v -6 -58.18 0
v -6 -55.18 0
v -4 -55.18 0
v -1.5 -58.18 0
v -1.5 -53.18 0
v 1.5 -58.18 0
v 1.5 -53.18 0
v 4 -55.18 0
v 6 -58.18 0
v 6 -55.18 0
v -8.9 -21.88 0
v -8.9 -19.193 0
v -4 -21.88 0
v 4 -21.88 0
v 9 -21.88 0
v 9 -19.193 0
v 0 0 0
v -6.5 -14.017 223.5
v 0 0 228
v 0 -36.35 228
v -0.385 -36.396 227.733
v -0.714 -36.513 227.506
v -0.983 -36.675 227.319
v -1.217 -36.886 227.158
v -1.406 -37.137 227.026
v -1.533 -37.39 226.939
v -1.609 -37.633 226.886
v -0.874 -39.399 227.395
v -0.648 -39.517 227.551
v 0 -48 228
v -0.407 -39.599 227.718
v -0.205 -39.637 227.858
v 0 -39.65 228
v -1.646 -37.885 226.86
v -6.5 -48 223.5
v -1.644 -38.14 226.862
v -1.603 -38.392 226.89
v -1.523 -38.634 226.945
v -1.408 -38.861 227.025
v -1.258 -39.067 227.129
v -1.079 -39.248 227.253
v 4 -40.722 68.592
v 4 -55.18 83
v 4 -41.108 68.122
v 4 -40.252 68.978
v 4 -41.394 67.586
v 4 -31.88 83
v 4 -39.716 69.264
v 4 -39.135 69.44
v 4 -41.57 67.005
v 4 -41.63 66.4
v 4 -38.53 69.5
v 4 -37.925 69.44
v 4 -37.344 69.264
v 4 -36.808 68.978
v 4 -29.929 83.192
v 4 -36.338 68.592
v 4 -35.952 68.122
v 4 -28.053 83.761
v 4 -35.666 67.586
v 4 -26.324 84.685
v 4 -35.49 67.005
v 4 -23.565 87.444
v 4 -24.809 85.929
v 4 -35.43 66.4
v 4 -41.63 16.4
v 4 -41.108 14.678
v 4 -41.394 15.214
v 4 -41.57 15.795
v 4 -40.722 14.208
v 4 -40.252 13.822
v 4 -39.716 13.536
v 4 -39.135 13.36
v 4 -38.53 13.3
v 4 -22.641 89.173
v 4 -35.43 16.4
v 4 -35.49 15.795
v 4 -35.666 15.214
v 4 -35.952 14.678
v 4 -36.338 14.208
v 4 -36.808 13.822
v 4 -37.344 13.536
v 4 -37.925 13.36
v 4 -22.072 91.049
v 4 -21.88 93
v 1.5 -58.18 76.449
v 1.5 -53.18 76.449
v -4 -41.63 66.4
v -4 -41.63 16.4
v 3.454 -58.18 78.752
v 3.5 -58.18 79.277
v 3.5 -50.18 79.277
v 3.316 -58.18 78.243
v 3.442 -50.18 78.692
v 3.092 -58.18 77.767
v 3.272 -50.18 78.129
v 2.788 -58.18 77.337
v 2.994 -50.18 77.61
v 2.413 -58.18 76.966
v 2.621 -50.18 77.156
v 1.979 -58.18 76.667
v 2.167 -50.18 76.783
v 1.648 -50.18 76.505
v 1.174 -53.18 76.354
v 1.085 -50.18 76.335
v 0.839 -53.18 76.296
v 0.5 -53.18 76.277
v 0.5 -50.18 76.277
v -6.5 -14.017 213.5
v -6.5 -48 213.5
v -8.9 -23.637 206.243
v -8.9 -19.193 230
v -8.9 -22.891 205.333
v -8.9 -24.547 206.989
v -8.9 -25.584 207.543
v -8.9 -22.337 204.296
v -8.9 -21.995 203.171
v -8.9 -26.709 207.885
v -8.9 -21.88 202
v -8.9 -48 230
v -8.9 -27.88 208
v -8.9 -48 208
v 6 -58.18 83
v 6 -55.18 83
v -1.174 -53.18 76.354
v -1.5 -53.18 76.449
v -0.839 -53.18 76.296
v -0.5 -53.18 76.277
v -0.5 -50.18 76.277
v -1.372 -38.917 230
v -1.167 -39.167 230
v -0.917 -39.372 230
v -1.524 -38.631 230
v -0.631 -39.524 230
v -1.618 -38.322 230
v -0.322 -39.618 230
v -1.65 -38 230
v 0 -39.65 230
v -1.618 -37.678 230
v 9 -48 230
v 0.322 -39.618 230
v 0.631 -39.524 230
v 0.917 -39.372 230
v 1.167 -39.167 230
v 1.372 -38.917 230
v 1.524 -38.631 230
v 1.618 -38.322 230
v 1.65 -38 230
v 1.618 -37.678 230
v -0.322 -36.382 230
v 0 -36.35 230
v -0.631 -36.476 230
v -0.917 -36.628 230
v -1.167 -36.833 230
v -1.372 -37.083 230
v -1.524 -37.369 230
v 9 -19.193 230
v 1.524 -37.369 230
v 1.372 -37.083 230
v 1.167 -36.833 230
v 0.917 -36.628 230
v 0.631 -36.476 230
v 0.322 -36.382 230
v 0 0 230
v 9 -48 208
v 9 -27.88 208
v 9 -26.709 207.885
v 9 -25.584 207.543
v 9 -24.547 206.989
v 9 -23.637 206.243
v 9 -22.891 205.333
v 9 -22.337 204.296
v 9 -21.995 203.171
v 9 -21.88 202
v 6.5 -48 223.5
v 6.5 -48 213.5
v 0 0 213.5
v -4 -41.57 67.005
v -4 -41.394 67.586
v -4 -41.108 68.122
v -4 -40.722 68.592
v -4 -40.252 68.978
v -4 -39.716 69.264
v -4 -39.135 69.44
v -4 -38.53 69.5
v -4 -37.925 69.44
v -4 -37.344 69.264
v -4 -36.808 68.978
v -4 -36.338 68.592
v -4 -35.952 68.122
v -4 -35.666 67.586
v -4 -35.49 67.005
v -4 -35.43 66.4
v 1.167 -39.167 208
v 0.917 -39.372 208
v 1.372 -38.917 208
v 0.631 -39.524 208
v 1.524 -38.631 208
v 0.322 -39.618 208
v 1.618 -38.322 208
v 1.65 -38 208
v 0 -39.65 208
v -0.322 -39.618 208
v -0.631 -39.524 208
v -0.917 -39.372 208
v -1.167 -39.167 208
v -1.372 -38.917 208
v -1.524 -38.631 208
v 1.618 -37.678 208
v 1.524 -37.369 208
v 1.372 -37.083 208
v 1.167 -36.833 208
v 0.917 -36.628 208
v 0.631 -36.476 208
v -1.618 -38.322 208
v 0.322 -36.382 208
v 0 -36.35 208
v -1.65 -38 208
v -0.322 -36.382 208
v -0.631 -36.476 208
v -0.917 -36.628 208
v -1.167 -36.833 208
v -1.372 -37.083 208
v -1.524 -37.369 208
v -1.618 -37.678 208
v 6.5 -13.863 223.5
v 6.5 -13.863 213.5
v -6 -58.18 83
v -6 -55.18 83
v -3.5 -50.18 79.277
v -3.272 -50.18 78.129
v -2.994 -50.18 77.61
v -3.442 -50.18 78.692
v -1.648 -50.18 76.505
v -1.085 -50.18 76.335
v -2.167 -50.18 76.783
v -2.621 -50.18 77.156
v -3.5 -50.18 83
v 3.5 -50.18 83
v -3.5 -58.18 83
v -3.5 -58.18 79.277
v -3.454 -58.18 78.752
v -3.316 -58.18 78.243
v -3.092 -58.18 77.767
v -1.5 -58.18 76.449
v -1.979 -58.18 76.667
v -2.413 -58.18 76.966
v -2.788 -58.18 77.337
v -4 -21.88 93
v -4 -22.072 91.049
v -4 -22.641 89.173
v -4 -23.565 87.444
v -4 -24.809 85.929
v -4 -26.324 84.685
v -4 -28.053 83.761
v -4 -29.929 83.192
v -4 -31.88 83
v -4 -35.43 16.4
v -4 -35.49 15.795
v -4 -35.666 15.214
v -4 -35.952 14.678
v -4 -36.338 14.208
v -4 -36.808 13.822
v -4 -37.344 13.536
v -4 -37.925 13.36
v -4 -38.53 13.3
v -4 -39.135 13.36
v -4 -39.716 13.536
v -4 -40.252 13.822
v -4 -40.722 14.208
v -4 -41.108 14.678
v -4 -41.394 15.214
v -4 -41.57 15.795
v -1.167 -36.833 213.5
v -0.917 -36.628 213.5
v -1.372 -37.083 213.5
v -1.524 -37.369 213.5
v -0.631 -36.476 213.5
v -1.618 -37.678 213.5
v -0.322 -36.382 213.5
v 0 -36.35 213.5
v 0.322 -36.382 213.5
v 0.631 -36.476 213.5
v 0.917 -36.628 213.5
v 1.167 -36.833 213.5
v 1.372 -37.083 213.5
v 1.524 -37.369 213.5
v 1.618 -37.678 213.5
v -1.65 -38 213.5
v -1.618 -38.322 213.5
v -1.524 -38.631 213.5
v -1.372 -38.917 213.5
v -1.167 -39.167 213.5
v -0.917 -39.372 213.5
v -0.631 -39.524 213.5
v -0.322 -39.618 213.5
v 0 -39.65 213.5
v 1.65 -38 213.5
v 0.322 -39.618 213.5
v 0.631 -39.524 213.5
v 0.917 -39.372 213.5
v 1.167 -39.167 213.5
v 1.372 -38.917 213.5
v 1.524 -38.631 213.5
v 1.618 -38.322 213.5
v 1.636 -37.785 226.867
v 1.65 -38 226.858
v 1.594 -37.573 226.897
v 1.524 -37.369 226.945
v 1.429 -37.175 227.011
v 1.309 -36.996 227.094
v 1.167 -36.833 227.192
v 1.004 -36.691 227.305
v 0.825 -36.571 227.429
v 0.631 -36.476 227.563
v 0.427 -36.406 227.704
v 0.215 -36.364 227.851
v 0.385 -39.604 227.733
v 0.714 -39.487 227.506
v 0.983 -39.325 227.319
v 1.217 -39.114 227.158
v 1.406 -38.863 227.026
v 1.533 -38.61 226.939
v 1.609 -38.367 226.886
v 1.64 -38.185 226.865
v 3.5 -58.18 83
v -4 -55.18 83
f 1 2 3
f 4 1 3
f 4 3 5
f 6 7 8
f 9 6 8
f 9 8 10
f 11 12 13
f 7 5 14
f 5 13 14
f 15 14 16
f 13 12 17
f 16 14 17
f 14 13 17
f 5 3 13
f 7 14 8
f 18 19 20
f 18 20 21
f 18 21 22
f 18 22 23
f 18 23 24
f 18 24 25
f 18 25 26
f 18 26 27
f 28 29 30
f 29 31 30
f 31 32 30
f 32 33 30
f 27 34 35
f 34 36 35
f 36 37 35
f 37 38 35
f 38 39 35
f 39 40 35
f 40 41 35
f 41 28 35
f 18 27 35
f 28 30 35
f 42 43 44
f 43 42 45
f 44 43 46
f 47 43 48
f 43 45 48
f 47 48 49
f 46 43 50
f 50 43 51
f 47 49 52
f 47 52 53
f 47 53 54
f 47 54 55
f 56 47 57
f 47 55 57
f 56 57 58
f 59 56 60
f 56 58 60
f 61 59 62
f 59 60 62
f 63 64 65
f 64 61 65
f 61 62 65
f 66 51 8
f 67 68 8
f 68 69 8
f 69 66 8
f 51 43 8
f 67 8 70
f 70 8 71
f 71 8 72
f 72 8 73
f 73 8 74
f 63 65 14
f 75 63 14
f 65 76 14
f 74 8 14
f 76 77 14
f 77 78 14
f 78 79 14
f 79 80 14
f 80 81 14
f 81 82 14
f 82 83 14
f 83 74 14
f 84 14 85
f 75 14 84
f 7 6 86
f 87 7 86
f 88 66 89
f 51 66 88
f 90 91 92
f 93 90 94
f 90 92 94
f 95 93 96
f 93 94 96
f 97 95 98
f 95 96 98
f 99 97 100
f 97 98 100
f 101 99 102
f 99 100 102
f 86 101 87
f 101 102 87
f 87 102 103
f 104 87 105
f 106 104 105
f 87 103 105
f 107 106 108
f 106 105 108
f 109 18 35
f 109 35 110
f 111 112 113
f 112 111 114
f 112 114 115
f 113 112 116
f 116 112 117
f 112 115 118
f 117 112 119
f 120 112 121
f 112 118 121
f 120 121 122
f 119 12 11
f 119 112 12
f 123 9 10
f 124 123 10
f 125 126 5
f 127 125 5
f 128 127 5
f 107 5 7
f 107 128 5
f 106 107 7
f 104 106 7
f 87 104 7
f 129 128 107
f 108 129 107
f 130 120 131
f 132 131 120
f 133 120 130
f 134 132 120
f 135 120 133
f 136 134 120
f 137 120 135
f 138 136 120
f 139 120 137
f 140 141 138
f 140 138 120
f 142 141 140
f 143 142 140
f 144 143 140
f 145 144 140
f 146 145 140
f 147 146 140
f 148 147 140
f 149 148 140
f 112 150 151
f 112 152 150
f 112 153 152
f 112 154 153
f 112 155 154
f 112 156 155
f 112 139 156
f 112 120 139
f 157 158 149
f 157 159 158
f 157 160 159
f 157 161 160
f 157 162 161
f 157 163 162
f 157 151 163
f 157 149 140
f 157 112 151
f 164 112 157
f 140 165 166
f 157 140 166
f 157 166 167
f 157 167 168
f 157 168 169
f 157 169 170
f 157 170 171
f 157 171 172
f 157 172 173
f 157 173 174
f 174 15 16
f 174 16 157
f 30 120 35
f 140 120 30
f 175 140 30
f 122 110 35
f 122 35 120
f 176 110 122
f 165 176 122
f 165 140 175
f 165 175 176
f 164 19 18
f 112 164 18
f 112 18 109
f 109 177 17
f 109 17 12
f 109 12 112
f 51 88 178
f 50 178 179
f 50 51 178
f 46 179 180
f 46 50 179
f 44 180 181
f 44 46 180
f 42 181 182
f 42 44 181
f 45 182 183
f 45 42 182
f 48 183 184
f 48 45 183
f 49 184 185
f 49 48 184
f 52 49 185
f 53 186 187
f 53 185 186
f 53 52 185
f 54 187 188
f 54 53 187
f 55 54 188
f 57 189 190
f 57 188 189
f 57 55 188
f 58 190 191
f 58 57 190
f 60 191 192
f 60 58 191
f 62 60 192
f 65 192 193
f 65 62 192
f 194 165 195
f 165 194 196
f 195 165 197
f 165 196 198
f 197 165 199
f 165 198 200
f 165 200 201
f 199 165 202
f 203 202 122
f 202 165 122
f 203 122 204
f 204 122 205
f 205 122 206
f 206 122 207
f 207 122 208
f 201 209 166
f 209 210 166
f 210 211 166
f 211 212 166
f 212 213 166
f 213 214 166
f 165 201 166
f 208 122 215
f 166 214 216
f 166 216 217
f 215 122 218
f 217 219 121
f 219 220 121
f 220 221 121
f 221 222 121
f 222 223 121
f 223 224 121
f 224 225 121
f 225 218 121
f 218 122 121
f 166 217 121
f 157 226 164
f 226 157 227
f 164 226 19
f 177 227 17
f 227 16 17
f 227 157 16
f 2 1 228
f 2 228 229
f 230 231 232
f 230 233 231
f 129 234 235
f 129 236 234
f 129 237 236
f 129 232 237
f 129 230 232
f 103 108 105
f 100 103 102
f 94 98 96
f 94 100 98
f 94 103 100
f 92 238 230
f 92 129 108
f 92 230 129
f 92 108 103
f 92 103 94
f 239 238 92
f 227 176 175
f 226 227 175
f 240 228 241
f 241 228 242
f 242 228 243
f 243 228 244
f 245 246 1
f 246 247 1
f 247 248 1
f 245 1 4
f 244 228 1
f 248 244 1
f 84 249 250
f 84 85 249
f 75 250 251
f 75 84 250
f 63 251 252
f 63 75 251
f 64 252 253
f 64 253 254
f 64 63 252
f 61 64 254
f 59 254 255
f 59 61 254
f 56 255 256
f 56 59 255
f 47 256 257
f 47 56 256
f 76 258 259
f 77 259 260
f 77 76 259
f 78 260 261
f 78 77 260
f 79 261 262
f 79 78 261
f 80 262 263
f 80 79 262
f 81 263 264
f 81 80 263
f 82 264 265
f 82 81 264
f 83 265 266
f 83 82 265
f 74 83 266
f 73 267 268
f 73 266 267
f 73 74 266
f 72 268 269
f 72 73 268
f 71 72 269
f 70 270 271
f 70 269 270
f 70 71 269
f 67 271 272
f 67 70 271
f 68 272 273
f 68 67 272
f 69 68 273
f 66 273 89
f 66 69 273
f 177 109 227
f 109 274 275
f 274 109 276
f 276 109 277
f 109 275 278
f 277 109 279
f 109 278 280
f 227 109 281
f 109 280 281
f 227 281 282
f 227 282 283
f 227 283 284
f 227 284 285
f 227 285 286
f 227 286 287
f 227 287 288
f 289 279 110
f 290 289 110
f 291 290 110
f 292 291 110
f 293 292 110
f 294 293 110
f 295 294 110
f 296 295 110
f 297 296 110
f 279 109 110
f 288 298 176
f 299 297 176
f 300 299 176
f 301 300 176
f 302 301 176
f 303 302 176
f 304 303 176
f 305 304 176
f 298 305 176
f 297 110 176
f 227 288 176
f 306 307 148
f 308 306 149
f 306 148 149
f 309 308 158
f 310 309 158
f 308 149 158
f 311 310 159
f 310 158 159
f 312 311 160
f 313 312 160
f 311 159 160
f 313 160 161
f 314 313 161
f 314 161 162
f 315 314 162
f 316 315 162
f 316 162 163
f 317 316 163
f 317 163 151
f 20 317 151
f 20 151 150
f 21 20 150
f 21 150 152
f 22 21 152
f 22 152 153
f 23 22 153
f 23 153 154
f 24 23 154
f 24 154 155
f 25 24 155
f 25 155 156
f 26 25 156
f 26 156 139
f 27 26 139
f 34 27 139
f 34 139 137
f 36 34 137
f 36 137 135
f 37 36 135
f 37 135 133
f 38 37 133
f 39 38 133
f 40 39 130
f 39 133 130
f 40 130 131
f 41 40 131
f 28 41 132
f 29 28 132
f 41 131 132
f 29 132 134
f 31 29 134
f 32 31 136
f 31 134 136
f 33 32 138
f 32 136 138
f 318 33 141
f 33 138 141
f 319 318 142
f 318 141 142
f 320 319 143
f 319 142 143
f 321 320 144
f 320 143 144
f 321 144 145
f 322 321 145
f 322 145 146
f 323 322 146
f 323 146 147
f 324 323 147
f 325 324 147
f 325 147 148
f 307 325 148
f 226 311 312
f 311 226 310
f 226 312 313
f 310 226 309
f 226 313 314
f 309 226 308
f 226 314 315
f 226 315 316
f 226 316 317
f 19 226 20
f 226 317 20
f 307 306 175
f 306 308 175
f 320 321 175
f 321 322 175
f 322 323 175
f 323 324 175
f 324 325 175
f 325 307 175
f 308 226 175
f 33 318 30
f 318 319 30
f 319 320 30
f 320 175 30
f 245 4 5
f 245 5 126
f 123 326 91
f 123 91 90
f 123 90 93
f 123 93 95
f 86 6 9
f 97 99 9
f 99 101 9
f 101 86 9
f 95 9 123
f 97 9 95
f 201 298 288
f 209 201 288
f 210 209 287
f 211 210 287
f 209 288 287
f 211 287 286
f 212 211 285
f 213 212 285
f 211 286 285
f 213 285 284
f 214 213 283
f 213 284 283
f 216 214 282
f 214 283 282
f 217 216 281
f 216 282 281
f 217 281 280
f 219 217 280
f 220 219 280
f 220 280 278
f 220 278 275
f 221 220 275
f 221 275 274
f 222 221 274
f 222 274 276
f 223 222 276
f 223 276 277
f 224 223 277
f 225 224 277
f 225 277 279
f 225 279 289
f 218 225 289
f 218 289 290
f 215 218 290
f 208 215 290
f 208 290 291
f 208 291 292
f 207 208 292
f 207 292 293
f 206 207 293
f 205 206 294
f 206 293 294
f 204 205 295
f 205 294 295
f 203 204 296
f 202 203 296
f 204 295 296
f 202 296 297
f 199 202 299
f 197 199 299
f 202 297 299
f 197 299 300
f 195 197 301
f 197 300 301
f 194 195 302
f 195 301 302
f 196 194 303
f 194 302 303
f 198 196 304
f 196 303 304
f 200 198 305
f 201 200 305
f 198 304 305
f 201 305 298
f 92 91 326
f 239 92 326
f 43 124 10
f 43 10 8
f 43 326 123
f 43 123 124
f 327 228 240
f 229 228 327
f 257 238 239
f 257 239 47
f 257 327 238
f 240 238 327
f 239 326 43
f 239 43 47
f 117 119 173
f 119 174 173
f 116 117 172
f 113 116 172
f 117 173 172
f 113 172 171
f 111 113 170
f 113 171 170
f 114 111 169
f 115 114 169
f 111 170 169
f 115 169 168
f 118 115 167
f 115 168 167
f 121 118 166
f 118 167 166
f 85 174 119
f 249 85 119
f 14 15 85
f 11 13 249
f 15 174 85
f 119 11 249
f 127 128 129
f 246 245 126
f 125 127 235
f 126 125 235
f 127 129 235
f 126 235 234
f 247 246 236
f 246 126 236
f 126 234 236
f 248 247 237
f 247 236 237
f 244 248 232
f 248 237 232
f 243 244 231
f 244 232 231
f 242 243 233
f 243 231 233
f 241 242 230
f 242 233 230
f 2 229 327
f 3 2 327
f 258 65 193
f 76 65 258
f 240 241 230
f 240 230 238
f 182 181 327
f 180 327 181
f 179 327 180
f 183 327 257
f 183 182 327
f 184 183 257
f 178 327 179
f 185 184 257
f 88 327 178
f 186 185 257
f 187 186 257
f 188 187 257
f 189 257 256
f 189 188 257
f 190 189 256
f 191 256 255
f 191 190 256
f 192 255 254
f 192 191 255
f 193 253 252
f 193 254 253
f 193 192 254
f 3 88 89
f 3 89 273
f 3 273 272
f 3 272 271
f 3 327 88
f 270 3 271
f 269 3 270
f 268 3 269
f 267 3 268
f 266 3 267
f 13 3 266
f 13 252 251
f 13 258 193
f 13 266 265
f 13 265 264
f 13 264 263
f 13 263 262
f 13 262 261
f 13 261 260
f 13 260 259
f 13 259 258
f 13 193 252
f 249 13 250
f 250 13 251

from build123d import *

# Parameters (mm, degrees)
BOSS_EXTRUDE1_DEPTH     = 230
CUT_EXTRUDE2_DEPTH      = 93
SKETCH4_W               = 125
SKETCH4_H               = 36.3
CUT_EXTRUDE3_DEPTH      = 18.9
FILLET3_R               = 10
FILLET4_R               = 6
SKETCH5_W               = 22
SKETCH5_H               = 10.18
CUT_EXTRUDE4_DEPTH      = 18.9
CUT_EXTRUDE5_REACH      = 14.9
CUT_EXTRUDE6_REACH      = 232
SKETCH7_R               = 1.65
CUT_EXTRUDE7_DEPTH      = 49
SKETCH9_W               = 3
SKETCH9_H               = 129.384798753
CUT_EXTRUDE8_DEPTH      = 1
CUT_EXTRUDE8_DEPTH_BACK = 5
SKETCH10_W              = 7
SKETCH10_H              = 13.446036232
CUT_EXTRUDE9_DEPTH      = 8
FILLET5_R               = 3


with BuildPart() as part:
    # Sketch1 → Boss-Extrude1 (new body)
    with BuildSketch(Plane.XY):
        Polygon((0, 0), (-8.900488428, -19.193232029), (-8.900488428, -58.18), (8.999511572, -58.18), (8.999511572, -19.193232029), align=None)
    extrude(amount=BOSS_EXTRUDE1_DEPTH)

    # Sketch3 → Cut-Extrude2 (cut)
    with BuildSketch(Plane(origin=(0, 0, 0), x_dir=(-1, 0, 0), z_dir=(0, 0, -1))):
        Polygon((-6, -58.18), (-6, -55.18), (-4, -55.18), (-4, -21.88), (-8.999511572, -21.88), (-8.999511572, -58.18), align=None)
        Polygon((6, -55.18), (4, -55.18), (4, -21.88), (8.999511572, -21.88), (8.999511572, -58.18), (6, -58.18), align=None)
    extrude(amount=-CUT_EXTRUDE2_DEPTH, mode=Mode.SUBTRACT)

    # Sketch4 → Cut-Extrude3 (cut, through all)
    with BuildSketch(Plane.ZY.offset(8.900488428)):
        with Locations((145.5, -40.03)):
            Rectangle(SKETCH4_W, SKETCH4_H)
    extrude(amount=-CUT_EXTRUDE3_DEPTH, mode=Mode.SUBTRACT)

    # Fillet3
    fillet3_edges = [part.edges().sort_by_distance(p)[0] for p in [
        (0, -21.88, 83),
    ]]
    fillet(fillet3_edges, radius=FILLET3_R)

    # Fillet4
    fillet4_edges = [part.edges().sort_by_distance(p)[0] for p in [
        (0.049511572, -21.88, 208),
    ]]
    fillet(fillet4_edges, radius=FILLET4_R)

    # Sketch5 → Cut-Extrude4 (cut, through all)
    with BuildSketch(Plane(origin=(8.999511572, 0, 0), x_dir=(0, 0, -1), z_dir=(1, 0, 0))):
        with Locations((-219, -53.09)):
            Rectangle(SKETCH5_W, SKETCH5_H)
    extrude(amount=-CUT_EXTRUDE4_DEPTH, mode=Mode.SUBTRACT)

    # Sketch6 → Cut-Extrude5 (cut, up to next)
    with BuildSketch(Plane(origin=(4, 0, 0), x_dir=(0, 0, -1), z_dir=(1, 0, 0)), mode=Mode.PRIVATE) as cut_extrude5_sk1:
        with BuildLine():
            Line((-66.4, -35.43), (-16.4, -35.43))
            ThreePointArc((-16.4, -35.43), (-13.3, -38.53), (-16.4, -41.63))
            Line((-16.4, -41.63), (-66.4, -41.63))
            ThreePointArc((-66.4, -41.63), (-69.5, -38.53), (-66.4, -35.43))
        make_face()
    cut_extrude5_tool1 = extrude(cut_extrude5_sk1.sketch, amount=-CUT_EXTRUDE5_REACH, mode=Mode.PRIVATE) & part.part
    add(cut_extrude5_tool1.solids().sort_by_distance((4, -38.53, 41.4))[0], mode=Mode.SUBTRACT)

    # Sketch7 → Cut-Extrude6 (cut, up to next)
    with BuildSketch(Plane.XY.offset(230), mode=Mode.PRIVATE) as cut_extrude6_sk1:
        with Locations((0, -38)):
            Circle(SKETCH7_R)
    cut_extrude6_tool1 = extrude(cut_extrude6_sk1.sketch, amount=-CUT_EXTRUDE6_REACH, mode=Mode.PRIVATE) & part.part
    add(cut_extrude6_tool1.solids().sort_by_distance((0, -38, 230))[0], mode=Mode.SUBTRACT)

    # Sketch8 → Cut-Extrude7 (cut, through all)
    with BuildSketch(Plane.XZ.offset(48)):
        Polygon((0, 228), (-6.5, 223.5), (-6.5, 213.5), (6.5, 213.5), (6.5, 223.5), align=None)
    extrude(amount=-CUT_EXTRUDE7_DEPTH, mode=Mode.SUBTRACT)

    # Sketch9 → Cut-Extrude8 (cut, two sides)
    with BuildSketch(Plane.XZ.offset(58.18)) as cut_extrude8_sk:
        with Locations((0, 45.686714954)):
            Rectangle(SKETCH9_W, SKETCH9_H)
    extrude(amount=CUT_EXTRUDE8_DEPTH, mode=Mode.SUBTRACT)
    extrude(cut_extrude8_sk.sketch, amount=-CUT_EXTRUDE8_DEPTH_BACK, mode=Mode.SUBTRACT)

    # Sketch10 → Cut-Extrude9 (cut)
    with BuildSketch(Plane.XZ.offset(58.18)):
        with Locations((0, 83)):
            Rectangle(SKETCH10_W, SKETCH10_H)
    extrude(amount=-CUT_EXTRUDE9_DEPTH, mode=Mode.SUBTRACT)

    # Fillet5
    fillet5_edges = [part.edges().sort_by_distance(p)[0] for p in [
        (3.5, -54.18, 76.276981884),
        (-3.5, -54.18, 76.276981884),
    ]]
    fillet(fillet5_edges, radius=FILLET5_R)


solid = part.part
